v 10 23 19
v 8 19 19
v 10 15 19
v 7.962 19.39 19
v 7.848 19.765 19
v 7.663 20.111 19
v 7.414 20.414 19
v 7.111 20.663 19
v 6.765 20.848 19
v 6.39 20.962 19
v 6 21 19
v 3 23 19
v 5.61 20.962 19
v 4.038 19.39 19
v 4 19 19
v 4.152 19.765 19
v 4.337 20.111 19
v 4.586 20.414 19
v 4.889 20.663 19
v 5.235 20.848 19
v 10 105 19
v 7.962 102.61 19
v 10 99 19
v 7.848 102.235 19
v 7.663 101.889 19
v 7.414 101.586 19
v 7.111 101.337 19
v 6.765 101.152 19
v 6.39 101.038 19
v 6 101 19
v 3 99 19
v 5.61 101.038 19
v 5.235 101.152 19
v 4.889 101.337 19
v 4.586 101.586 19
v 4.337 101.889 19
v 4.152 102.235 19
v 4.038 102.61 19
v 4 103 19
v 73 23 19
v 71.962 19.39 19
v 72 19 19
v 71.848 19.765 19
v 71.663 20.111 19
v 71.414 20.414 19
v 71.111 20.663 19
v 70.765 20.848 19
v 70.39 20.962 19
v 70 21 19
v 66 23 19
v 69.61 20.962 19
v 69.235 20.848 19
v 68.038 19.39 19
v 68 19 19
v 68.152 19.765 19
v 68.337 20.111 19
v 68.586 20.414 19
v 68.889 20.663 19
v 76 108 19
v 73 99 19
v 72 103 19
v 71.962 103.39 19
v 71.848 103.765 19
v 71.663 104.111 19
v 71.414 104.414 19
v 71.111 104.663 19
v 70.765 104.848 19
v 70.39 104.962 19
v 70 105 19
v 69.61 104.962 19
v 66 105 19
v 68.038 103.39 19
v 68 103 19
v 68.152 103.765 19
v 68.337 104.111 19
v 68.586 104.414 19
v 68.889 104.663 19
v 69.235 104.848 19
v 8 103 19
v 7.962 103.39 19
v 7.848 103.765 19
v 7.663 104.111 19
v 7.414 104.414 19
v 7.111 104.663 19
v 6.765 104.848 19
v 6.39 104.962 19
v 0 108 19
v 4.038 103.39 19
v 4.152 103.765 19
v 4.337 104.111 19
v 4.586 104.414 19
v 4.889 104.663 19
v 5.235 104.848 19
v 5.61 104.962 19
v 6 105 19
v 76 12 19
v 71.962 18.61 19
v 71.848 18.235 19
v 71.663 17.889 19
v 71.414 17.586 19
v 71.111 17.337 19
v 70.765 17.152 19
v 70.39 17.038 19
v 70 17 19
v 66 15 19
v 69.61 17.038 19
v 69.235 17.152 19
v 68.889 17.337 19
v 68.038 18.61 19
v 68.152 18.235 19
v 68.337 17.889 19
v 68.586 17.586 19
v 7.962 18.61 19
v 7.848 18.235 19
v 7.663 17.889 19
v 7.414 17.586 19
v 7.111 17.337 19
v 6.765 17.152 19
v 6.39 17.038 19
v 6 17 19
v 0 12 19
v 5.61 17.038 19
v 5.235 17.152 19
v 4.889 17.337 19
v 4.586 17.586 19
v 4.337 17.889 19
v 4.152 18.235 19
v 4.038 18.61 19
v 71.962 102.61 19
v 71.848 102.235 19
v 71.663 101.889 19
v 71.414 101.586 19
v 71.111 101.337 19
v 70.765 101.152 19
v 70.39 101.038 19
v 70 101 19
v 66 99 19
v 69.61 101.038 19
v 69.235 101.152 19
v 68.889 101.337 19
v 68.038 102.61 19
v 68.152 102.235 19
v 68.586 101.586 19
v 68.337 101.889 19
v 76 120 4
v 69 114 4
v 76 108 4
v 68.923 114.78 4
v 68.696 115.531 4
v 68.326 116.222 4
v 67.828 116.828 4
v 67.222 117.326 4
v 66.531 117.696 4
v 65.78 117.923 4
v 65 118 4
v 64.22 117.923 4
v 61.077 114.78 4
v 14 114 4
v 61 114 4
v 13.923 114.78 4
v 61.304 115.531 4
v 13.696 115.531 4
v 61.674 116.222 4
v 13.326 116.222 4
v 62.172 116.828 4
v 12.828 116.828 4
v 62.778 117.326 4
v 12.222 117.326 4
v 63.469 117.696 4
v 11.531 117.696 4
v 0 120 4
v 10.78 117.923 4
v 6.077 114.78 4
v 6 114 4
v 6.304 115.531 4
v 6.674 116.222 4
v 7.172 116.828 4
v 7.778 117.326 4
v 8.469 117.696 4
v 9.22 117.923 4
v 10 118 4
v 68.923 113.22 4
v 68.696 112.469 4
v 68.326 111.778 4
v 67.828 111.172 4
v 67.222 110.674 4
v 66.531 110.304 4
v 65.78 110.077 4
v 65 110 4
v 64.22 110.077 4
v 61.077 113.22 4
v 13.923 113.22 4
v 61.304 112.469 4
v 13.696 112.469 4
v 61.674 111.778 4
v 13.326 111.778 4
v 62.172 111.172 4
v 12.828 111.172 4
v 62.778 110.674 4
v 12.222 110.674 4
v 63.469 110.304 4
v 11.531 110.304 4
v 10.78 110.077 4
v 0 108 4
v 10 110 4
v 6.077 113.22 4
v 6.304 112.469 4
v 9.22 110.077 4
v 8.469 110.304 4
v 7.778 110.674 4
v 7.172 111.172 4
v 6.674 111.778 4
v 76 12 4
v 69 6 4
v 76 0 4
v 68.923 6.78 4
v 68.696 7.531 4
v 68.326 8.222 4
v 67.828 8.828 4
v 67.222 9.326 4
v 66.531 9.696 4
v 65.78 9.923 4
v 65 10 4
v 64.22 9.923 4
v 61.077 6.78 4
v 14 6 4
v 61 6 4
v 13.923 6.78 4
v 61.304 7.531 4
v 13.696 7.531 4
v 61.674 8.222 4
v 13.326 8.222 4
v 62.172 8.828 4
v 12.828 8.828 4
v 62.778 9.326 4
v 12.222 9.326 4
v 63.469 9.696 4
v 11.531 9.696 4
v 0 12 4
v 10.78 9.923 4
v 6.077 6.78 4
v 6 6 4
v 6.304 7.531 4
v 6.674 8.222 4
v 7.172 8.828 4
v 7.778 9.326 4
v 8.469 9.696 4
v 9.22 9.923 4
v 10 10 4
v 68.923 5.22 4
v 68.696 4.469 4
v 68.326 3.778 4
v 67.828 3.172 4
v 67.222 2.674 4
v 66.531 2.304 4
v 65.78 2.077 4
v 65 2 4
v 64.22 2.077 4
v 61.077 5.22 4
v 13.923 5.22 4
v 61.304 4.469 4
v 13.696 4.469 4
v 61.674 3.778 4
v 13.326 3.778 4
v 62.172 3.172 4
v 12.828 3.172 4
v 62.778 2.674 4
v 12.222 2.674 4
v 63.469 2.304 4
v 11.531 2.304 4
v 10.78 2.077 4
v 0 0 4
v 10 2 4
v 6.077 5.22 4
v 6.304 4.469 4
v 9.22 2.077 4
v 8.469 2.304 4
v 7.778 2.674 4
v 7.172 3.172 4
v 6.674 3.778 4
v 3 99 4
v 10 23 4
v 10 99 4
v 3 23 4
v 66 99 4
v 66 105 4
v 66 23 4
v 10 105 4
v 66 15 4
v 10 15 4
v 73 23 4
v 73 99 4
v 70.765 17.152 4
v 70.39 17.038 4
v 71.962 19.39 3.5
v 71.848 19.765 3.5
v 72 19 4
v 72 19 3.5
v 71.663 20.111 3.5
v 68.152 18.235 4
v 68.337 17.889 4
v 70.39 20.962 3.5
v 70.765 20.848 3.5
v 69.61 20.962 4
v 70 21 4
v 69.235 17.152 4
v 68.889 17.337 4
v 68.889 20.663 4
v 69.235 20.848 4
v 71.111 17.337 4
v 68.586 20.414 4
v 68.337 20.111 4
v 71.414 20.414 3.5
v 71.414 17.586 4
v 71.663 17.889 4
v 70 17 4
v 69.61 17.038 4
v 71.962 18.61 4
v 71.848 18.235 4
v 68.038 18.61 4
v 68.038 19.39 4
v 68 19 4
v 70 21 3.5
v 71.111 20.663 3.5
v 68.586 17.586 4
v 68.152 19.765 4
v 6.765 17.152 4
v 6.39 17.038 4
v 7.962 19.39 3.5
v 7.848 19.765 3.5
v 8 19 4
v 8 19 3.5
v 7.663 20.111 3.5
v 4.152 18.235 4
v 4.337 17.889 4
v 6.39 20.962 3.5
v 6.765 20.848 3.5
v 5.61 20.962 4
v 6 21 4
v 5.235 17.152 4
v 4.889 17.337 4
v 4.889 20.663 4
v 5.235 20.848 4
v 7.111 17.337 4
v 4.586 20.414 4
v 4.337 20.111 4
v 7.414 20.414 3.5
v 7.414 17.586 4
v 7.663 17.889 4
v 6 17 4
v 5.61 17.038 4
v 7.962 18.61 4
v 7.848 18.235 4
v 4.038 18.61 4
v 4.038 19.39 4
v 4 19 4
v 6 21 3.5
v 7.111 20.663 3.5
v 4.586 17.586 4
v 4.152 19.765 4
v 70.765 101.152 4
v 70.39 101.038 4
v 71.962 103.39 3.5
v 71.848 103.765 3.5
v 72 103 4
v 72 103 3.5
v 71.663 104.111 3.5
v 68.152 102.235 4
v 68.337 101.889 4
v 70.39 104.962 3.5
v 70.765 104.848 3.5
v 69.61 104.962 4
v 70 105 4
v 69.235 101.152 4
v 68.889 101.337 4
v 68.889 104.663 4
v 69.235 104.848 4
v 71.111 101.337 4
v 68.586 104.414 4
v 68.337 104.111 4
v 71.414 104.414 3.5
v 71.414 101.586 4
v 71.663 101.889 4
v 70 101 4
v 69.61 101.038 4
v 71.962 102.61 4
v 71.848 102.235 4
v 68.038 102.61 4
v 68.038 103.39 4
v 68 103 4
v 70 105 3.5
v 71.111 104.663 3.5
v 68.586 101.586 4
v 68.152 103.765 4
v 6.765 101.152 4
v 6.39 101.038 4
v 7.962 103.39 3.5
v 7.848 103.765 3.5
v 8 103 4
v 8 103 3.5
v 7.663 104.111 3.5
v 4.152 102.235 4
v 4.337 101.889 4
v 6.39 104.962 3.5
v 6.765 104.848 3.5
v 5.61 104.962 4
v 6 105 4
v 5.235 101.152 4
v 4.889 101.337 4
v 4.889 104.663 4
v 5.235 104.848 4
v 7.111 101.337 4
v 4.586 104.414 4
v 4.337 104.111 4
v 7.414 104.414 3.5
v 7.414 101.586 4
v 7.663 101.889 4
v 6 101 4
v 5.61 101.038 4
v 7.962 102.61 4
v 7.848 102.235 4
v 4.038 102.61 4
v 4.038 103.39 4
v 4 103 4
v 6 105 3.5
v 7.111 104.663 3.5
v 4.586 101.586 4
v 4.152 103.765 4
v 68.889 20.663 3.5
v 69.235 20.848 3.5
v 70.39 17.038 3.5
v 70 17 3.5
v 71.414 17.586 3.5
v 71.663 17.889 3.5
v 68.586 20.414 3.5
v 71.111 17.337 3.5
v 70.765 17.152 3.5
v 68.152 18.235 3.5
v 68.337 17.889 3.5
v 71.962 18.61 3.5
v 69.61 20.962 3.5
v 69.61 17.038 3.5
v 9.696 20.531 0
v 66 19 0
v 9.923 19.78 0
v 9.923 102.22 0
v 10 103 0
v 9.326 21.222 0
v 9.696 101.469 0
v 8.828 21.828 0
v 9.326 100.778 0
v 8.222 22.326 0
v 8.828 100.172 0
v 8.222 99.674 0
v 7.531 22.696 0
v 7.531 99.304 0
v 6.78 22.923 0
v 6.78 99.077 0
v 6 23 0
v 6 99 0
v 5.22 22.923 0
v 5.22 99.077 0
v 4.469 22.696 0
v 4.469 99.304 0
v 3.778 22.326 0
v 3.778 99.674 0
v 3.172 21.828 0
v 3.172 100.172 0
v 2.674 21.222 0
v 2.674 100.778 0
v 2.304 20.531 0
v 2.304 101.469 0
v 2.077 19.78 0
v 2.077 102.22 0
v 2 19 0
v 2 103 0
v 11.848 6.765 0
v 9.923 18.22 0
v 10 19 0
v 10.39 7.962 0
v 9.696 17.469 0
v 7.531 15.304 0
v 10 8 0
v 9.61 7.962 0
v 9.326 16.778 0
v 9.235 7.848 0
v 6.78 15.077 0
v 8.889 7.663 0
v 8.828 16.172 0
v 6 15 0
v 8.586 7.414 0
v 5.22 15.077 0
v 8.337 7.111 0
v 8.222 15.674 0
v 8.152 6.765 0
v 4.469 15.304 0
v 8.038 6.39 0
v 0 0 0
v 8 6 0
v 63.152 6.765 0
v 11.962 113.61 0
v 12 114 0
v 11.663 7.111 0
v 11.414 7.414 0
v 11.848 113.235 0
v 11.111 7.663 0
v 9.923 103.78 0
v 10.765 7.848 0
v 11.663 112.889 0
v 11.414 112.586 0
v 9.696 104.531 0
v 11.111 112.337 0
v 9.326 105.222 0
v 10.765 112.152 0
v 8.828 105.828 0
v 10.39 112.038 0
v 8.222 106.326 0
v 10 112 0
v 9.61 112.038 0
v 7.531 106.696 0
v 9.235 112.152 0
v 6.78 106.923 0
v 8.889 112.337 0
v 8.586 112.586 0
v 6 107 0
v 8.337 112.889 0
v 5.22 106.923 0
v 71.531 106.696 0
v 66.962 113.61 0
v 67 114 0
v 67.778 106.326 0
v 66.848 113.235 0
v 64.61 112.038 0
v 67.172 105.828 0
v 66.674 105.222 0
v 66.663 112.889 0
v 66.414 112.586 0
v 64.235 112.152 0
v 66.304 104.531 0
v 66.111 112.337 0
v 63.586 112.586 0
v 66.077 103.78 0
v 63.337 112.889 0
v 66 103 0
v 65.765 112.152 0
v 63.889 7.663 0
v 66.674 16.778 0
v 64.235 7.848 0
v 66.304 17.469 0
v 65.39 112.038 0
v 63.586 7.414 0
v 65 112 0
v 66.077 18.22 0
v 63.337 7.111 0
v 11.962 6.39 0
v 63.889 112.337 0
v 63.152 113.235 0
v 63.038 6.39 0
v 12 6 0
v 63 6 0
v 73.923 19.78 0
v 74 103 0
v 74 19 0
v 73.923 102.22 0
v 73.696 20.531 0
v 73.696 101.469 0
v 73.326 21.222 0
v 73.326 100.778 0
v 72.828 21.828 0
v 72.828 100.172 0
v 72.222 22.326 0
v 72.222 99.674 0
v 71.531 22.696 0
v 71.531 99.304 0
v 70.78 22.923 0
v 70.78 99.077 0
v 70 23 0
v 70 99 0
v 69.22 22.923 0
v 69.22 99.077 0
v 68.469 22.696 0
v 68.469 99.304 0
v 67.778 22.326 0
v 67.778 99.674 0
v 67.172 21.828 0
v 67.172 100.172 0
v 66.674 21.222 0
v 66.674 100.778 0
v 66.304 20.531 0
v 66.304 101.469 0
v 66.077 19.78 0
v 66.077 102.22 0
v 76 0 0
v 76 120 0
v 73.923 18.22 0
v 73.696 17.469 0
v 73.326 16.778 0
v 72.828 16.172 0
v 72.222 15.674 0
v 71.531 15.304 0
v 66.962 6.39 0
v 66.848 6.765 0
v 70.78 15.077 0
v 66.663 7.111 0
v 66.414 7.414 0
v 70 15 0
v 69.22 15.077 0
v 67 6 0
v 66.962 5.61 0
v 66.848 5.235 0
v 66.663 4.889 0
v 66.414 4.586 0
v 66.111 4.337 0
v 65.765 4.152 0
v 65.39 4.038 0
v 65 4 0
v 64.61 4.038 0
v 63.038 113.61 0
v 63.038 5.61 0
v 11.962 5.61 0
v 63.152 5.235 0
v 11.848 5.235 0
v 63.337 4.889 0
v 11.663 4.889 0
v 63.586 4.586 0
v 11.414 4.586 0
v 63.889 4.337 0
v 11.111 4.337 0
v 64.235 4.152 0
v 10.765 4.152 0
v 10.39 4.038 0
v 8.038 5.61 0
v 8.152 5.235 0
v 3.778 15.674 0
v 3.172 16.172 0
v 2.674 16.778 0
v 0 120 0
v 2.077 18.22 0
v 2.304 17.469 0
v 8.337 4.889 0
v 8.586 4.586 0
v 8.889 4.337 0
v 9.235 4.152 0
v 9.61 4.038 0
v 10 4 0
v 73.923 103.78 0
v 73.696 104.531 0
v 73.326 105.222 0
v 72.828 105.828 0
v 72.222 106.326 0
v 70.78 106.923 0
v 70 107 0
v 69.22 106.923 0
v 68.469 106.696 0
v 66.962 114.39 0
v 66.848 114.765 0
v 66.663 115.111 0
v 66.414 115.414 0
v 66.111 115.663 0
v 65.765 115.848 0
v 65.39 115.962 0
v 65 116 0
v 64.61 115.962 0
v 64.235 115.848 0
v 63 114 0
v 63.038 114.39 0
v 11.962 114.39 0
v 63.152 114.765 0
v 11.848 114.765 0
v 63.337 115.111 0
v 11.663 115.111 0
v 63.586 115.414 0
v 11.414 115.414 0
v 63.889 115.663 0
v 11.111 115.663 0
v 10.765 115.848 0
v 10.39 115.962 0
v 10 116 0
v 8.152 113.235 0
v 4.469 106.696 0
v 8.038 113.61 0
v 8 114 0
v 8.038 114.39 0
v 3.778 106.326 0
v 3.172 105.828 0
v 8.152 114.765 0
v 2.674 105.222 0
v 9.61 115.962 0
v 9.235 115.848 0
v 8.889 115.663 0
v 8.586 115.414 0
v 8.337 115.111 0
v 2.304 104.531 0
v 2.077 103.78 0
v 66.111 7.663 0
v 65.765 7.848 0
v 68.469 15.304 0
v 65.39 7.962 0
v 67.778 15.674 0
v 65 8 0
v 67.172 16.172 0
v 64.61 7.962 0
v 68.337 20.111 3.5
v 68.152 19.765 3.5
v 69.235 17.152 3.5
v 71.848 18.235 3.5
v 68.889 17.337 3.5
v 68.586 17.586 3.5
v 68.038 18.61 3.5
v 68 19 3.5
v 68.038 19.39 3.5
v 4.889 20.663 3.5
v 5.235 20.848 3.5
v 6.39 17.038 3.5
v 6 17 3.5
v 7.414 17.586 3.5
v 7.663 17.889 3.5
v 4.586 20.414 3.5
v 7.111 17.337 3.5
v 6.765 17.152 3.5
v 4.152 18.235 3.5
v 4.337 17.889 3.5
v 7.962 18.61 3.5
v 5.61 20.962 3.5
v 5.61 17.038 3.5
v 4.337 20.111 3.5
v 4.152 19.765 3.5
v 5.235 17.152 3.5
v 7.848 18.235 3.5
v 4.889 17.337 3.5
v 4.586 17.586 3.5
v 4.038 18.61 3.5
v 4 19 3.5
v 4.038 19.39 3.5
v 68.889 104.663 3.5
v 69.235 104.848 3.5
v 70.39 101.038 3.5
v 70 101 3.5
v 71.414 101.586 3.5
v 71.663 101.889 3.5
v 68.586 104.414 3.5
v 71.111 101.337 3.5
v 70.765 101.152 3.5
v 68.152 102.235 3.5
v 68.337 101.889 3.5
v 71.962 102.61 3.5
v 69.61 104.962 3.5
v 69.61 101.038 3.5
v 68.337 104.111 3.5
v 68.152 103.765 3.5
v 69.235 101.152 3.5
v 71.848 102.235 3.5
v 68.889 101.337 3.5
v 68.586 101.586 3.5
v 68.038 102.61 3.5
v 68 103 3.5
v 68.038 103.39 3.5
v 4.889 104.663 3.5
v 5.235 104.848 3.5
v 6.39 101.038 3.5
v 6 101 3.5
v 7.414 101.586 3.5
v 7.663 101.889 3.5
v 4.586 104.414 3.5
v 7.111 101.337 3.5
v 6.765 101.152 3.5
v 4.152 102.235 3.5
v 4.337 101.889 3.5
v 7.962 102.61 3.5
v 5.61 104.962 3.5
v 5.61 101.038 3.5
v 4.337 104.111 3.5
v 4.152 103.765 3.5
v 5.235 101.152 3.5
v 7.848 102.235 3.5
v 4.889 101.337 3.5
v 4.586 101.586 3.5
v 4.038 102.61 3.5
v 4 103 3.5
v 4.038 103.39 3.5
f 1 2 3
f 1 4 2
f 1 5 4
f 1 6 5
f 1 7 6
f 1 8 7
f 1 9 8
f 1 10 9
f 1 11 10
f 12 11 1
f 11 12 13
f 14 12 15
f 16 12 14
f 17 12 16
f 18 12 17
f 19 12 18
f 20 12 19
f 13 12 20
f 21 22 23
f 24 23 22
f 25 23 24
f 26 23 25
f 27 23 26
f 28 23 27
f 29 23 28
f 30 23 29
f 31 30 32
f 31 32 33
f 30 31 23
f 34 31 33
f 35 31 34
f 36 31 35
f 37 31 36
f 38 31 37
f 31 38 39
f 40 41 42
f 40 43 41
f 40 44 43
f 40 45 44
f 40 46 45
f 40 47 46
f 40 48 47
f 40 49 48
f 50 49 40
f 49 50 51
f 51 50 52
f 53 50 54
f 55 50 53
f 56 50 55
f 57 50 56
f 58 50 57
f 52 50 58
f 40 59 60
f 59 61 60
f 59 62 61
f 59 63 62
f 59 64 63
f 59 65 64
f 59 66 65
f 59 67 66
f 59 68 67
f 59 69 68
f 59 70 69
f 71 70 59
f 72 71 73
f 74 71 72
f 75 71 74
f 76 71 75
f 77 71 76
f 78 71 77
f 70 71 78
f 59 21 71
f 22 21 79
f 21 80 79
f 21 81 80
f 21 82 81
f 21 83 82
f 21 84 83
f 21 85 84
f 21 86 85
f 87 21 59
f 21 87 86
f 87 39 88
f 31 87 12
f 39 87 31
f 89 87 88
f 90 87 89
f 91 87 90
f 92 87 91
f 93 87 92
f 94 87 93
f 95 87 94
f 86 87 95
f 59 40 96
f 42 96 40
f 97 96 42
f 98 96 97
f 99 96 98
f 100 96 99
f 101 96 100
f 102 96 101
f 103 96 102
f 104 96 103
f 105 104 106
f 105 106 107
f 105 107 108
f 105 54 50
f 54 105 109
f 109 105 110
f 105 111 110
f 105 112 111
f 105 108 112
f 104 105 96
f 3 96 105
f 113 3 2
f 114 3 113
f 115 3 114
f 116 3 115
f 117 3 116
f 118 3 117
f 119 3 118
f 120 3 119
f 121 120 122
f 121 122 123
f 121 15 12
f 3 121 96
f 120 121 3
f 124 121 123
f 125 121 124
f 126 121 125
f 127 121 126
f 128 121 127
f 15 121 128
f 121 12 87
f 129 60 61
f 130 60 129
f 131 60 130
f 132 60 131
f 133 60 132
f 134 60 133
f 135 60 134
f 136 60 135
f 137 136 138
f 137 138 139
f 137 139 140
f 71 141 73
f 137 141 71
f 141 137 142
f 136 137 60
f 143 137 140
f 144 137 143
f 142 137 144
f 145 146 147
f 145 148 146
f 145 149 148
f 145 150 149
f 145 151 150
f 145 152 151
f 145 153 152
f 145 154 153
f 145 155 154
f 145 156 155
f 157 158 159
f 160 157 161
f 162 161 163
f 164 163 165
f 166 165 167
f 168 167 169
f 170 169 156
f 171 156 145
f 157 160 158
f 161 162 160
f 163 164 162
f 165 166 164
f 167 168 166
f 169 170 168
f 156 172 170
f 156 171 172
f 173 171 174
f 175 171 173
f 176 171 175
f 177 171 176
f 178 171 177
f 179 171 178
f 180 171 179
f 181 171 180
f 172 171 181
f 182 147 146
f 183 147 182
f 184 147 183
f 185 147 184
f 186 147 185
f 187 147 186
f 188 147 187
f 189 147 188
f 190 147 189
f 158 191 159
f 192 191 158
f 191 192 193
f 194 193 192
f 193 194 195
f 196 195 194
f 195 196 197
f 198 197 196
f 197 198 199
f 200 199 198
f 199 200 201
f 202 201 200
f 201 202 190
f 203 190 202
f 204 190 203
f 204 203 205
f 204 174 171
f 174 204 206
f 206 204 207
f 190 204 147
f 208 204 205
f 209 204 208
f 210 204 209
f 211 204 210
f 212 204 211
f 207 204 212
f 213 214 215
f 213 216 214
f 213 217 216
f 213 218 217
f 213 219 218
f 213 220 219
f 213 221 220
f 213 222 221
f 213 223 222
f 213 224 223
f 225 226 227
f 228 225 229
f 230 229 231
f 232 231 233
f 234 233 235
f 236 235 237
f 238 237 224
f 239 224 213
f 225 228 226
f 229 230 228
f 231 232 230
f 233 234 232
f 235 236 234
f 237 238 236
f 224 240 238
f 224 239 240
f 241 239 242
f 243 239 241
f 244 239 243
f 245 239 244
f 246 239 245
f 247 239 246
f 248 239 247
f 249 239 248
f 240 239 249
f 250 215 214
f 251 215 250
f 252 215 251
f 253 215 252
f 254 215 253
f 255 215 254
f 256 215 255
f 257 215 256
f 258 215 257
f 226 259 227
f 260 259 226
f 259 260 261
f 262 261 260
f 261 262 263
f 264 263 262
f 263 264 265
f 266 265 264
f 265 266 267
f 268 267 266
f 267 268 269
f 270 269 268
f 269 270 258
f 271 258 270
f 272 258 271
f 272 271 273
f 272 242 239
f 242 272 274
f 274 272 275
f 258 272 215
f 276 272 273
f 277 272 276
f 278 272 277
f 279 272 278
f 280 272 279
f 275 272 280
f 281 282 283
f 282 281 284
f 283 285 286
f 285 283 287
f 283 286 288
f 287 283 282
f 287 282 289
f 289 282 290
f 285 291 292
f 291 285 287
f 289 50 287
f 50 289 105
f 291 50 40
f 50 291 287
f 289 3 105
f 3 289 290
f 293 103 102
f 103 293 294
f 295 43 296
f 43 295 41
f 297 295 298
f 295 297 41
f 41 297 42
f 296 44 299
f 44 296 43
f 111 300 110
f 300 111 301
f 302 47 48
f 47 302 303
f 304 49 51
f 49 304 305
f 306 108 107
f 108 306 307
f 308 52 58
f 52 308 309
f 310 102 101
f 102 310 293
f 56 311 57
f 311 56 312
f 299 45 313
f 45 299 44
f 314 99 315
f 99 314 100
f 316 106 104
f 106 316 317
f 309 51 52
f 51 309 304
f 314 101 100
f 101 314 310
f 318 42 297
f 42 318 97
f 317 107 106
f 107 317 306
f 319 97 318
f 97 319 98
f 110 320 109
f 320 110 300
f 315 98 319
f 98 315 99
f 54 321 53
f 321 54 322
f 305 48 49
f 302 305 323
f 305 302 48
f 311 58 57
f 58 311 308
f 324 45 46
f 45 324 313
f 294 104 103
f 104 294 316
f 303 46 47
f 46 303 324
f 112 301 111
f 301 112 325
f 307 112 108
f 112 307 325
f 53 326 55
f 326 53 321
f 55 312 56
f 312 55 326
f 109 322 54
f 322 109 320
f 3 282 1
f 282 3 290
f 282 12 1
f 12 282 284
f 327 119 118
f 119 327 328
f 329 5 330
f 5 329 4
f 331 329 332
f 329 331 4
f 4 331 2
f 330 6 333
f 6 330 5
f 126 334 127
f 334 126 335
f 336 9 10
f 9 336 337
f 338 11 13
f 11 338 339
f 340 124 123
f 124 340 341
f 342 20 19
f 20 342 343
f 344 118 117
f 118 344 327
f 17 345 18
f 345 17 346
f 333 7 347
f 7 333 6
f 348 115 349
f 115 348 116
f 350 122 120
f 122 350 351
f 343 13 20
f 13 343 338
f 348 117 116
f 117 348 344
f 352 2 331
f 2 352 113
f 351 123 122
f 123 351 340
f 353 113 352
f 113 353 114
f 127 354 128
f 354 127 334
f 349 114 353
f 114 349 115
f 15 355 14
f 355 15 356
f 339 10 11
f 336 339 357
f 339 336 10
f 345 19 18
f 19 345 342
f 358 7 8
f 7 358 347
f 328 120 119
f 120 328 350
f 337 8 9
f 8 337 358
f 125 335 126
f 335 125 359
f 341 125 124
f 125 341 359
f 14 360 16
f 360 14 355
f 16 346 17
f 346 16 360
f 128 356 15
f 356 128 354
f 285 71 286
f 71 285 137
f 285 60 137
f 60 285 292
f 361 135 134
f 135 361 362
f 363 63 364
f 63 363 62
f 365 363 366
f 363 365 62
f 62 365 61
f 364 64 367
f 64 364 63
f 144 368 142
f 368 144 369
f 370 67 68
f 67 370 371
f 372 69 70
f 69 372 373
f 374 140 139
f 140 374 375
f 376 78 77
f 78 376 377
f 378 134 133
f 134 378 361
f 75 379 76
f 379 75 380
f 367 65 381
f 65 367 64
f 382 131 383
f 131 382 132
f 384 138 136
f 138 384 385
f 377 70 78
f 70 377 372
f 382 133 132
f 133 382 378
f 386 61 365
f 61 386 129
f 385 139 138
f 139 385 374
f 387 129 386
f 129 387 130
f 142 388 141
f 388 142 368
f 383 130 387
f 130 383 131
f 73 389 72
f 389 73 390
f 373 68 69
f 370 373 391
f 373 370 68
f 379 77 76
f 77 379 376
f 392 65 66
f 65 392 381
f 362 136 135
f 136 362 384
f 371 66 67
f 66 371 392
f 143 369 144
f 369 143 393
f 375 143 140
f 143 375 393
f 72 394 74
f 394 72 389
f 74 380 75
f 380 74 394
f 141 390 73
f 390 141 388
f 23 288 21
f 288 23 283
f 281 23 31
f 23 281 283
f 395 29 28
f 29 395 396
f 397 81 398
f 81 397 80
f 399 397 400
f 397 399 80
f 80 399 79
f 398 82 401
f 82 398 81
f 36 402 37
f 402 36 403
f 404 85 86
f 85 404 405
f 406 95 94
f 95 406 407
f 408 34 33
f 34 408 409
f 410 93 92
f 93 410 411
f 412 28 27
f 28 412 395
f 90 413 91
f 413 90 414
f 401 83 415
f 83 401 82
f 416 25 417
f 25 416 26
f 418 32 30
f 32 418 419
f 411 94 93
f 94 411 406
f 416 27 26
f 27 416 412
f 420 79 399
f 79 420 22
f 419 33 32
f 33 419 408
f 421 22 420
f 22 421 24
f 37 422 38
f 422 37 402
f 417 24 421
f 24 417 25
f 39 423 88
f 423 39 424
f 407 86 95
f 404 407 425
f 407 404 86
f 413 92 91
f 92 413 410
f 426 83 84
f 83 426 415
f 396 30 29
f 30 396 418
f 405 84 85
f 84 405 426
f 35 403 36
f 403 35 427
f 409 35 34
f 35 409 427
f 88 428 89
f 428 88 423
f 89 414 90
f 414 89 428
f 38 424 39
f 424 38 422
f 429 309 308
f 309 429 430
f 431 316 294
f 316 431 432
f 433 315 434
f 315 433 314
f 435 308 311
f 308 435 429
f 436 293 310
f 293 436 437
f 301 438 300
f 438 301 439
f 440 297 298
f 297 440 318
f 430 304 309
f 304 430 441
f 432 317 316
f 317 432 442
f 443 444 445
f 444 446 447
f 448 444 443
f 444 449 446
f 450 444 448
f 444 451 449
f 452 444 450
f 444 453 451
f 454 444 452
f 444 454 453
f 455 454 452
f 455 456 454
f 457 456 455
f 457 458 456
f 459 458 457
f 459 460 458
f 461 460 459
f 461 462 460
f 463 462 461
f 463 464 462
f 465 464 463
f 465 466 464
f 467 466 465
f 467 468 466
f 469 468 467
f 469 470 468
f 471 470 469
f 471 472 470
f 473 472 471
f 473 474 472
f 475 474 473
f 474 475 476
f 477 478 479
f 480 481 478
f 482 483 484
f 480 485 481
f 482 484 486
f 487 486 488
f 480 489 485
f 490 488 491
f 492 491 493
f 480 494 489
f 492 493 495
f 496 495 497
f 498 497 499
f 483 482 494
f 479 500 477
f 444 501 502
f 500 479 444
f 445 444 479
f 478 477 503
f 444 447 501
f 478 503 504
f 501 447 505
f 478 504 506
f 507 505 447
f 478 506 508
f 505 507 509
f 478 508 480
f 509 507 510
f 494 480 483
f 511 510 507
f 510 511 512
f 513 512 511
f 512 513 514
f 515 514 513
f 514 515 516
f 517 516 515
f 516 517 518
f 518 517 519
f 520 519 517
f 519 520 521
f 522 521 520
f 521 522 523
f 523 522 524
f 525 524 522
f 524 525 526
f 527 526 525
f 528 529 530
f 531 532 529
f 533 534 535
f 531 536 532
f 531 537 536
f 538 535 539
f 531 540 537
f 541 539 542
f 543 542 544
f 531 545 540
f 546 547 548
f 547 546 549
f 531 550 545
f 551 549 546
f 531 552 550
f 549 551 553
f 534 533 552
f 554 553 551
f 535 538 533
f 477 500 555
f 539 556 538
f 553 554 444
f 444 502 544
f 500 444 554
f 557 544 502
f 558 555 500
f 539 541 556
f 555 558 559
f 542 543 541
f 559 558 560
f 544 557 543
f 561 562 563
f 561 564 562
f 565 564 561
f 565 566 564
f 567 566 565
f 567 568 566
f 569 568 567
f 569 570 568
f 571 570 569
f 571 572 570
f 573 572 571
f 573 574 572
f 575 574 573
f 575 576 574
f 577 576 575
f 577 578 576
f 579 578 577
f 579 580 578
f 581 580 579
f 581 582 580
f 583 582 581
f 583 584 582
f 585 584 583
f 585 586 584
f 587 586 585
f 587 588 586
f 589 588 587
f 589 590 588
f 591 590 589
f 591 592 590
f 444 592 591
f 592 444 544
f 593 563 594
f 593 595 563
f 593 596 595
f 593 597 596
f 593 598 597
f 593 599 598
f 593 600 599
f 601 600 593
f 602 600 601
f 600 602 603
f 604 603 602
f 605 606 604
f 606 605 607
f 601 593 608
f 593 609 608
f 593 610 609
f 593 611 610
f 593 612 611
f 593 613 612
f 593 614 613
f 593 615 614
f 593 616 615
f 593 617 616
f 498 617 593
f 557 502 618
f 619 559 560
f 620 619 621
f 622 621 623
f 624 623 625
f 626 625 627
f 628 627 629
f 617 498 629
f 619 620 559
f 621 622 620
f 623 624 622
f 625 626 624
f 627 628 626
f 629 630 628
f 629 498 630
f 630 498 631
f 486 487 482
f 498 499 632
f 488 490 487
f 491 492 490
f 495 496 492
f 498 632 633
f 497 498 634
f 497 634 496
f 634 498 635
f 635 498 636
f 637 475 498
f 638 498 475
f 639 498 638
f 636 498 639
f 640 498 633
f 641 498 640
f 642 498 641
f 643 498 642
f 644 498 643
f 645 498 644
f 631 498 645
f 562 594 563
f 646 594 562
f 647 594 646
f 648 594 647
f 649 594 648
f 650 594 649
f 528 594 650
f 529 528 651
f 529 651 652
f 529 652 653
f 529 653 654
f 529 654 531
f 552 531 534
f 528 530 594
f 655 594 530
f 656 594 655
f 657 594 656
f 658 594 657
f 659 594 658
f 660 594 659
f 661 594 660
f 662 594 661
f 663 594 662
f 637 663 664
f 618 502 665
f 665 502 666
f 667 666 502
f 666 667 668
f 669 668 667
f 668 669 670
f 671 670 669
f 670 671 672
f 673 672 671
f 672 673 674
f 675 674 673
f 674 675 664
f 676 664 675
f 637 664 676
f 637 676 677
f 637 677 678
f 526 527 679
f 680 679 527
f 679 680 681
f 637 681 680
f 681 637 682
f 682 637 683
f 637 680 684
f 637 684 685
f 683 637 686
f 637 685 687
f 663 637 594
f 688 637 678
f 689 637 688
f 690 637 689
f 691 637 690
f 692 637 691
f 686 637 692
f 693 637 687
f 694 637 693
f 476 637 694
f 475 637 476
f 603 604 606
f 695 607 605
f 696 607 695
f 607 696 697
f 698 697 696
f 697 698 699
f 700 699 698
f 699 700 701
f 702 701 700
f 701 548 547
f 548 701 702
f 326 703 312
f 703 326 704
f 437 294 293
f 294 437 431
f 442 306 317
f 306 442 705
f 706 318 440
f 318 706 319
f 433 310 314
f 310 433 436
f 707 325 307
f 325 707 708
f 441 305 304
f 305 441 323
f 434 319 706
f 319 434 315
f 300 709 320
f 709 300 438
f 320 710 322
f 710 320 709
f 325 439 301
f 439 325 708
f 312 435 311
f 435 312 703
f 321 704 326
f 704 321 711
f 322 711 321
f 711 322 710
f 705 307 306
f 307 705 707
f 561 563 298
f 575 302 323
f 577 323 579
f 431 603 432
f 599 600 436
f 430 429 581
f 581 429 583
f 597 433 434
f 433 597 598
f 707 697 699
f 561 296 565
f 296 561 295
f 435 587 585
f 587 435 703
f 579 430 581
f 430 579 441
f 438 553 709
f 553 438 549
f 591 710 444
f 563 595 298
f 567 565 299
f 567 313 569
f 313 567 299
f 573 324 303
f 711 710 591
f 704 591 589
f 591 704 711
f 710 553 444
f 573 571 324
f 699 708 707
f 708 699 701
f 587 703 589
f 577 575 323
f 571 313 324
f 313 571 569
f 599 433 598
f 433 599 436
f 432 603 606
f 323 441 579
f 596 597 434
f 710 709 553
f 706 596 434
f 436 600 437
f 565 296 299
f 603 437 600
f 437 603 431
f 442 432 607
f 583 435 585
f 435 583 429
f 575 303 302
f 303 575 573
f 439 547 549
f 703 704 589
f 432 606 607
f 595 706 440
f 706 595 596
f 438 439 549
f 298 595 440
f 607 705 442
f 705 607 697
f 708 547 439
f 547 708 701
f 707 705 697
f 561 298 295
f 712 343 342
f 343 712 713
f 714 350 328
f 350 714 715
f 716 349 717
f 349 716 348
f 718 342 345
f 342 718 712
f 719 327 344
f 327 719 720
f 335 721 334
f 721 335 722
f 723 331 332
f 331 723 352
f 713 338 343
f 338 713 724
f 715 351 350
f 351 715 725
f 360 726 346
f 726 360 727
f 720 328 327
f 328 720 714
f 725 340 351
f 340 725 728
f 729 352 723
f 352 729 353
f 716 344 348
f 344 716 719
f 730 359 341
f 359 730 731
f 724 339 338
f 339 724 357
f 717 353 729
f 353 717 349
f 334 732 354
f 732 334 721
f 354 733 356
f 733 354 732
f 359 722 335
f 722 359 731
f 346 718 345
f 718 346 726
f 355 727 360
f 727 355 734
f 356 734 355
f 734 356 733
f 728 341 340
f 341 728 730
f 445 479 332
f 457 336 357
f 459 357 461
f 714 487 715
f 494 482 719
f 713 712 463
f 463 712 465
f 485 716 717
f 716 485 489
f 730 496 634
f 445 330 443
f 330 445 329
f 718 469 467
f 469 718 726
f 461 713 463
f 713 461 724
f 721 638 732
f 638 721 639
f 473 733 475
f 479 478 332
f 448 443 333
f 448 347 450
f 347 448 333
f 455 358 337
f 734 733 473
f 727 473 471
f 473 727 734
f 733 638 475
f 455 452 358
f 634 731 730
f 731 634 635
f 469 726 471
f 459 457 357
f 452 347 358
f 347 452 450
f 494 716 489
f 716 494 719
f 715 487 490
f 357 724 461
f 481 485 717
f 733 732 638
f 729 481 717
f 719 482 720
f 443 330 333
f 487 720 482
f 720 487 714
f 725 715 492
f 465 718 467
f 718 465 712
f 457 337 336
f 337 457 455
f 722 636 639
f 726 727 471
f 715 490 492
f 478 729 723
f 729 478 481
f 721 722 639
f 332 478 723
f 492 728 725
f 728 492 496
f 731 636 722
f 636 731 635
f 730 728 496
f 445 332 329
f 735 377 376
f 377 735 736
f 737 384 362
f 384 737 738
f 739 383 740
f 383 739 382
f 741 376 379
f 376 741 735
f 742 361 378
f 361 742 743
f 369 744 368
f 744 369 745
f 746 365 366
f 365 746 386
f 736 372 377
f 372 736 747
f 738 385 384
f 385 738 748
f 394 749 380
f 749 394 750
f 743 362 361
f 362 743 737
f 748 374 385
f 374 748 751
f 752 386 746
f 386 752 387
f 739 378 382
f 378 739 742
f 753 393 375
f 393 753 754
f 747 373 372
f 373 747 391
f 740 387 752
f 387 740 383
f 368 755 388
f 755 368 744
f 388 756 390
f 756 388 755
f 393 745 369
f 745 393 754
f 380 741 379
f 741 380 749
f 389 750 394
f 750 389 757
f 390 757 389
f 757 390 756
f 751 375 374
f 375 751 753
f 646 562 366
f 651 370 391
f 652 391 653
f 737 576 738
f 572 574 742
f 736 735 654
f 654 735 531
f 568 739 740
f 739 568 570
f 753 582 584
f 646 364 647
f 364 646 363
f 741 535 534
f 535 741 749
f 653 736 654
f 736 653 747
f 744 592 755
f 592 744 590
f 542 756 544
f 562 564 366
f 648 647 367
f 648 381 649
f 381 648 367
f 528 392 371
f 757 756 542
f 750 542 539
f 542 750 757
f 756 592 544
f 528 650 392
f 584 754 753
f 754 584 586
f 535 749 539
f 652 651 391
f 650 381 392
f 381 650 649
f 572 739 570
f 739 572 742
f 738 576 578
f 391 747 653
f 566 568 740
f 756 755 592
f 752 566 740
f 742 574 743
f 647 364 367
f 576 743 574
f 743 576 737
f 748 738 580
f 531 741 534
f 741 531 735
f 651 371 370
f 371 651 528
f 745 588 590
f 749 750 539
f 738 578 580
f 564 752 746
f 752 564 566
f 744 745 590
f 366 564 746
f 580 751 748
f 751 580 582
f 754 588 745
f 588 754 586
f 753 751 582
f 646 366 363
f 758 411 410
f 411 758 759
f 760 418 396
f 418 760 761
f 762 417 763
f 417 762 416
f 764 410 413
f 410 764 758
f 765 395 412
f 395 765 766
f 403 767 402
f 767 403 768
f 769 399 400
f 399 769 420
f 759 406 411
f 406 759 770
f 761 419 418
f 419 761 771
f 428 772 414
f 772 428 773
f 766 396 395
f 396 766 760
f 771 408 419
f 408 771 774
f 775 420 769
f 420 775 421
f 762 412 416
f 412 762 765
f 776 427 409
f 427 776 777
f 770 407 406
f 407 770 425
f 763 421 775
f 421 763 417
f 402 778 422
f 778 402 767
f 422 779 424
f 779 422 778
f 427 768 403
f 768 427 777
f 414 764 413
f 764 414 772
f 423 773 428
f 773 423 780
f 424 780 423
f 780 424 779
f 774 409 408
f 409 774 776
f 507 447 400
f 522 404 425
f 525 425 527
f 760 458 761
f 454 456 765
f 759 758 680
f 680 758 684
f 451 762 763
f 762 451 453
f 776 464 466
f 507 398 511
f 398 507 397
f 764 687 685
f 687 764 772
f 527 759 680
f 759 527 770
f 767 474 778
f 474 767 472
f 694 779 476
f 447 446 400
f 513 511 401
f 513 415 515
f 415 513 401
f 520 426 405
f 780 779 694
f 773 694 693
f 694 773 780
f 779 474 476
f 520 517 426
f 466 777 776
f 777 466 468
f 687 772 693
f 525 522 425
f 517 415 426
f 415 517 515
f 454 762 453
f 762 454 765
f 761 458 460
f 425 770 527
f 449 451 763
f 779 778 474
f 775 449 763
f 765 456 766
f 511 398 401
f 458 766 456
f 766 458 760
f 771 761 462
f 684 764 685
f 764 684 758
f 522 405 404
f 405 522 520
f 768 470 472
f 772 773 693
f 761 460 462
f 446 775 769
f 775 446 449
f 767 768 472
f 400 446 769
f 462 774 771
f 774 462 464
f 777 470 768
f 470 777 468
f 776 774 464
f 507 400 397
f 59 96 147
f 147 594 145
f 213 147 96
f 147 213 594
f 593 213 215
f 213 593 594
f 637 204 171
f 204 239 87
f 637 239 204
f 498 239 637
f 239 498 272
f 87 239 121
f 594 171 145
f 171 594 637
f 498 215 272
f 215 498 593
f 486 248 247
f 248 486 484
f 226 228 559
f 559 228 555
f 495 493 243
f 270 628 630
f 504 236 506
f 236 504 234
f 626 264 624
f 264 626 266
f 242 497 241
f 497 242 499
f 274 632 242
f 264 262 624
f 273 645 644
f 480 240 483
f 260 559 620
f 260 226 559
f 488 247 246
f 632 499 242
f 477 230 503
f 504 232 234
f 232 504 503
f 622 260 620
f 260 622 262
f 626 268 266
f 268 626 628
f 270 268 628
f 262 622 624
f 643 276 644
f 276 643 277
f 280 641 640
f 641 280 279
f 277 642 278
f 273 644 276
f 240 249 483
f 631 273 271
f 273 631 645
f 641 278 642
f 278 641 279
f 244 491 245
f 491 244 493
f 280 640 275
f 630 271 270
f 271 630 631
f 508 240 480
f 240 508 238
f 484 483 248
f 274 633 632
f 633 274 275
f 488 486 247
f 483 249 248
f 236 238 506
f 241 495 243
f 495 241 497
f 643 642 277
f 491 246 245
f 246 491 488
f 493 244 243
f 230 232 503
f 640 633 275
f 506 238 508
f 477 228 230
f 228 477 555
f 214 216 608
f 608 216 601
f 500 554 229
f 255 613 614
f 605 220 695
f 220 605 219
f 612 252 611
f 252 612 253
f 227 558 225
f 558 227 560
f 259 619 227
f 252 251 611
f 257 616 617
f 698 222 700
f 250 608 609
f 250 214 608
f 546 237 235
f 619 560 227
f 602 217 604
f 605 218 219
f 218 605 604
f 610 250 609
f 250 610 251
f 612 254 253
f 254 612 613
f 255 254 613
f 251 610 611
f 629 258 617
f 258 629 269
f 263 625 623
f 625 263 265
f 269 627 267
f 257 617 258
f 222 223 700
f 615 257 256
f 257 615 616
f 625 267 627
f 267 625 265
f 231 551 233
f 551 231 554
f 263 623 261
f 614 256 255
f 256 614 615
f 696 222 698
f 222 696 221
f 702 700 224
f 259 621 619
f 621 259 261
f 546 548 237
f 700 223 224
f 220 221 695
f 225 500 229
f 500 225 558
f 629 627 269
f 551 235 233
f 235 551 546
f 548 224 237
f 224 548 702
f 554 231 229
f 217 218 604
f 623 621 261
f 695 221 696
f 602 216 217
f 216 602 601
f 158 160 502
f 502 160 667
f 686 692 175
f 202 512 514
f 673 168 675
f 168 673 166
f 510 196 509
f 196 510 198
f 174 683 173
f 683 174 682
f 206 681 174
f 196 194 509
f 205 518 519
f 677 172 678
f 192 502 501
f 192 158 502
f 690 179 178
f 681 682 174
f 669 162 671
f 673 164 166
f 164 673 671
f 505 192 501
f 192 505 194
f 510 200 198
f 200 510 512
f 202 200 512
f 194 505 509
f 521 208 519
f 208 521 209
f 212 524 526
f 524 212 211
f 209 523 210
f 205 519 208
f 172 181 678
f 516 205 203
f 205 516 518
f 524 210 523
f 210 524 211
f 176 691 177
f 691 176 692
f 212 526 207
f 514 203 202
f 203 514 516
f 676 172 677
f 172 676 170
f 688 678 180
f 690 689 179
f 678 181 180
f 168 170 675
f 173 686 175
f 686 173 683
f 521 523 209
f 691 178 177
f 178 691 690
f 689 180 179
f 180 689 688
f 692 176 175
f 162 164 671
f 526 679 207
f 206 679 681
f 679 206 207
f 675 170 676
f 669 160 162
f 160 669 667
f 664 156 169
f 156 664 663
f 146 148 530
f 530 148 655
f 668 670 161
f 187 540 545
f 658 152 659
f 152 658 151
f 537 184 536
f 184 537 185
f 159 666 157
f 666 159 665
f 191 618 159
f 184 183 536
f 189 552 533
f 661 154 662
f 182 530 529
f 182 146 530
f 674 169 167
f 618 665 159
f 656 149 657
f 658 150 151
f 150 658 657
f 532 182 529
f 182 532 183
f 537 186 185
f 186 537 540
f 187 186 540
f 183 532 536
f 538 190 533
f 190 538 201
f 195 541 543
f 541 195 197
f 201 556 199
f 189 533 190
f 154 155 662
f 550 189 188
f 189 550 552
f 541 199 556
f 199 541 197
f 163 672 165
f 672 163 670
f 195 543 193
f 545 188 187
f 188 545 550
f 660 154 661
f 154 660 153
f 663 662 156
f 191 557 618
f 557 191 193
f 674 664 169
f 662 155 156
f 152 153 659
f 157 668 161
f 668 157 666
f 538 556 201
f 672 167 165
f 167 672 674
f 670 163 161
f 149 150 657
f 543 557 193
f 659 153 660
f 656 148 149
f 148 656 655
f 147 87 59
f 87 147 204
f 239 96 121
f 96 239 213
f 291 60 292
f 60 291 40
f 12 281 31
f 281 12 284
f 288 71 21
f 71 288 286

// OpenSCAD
module CoverPlateHole(x, y) {
  translate([x, y, 17])
    union() {
      
      difference() {
        translate([-1, -1, -13])
          cube([8, 8, 15]);
        translate([3, 3, -17])
        cylinder(h=19, d=4, $fn=32);
      }  
    }
}

module CoverPlatePunch(x, y) {
  translate([x + 3, y + 3, 0]) 
    union() {
    cylinder(h=15, d=4, $fn=32);
    cylinder(h=3.5, d1 = 8, d2 = 4, $fn = 32);  
  }
}

module MountingHole(x, y) {
    translate([x, y, 0])
    cylinder(h=4, d1 = 4, d2 = 8, $fn = 32);  
}

translate([15, 33, 0]){
CoverPlateHole(52, -17);
CoverPlateHole(-12, -17);
CoverPlateHole(52, 67);
CoverPlateHole(-12, 67);
}

difference() {
cube([76, 120, 4]);
  
    CoverPlatePunch(67, 16);
    CoverPlatePunch(3, 16);
    CoverPlatePunch(67, 100);
    CoverPlatePunch(3, 100);

    MountingHole(10, 6);
    MountingHole(65, 6);
    MountingHole(10, 114);
    MountingHole(65, 114);
  
}
translate([0, 12, 4])

difference() {
  cube([76, 96, 15]);
  translate([3, 3, 0])
    cube([70, 90, 15]);
}

//translate([8, 16, 0])
//cylinder(h = 30, d = 4, $fn = 32);
